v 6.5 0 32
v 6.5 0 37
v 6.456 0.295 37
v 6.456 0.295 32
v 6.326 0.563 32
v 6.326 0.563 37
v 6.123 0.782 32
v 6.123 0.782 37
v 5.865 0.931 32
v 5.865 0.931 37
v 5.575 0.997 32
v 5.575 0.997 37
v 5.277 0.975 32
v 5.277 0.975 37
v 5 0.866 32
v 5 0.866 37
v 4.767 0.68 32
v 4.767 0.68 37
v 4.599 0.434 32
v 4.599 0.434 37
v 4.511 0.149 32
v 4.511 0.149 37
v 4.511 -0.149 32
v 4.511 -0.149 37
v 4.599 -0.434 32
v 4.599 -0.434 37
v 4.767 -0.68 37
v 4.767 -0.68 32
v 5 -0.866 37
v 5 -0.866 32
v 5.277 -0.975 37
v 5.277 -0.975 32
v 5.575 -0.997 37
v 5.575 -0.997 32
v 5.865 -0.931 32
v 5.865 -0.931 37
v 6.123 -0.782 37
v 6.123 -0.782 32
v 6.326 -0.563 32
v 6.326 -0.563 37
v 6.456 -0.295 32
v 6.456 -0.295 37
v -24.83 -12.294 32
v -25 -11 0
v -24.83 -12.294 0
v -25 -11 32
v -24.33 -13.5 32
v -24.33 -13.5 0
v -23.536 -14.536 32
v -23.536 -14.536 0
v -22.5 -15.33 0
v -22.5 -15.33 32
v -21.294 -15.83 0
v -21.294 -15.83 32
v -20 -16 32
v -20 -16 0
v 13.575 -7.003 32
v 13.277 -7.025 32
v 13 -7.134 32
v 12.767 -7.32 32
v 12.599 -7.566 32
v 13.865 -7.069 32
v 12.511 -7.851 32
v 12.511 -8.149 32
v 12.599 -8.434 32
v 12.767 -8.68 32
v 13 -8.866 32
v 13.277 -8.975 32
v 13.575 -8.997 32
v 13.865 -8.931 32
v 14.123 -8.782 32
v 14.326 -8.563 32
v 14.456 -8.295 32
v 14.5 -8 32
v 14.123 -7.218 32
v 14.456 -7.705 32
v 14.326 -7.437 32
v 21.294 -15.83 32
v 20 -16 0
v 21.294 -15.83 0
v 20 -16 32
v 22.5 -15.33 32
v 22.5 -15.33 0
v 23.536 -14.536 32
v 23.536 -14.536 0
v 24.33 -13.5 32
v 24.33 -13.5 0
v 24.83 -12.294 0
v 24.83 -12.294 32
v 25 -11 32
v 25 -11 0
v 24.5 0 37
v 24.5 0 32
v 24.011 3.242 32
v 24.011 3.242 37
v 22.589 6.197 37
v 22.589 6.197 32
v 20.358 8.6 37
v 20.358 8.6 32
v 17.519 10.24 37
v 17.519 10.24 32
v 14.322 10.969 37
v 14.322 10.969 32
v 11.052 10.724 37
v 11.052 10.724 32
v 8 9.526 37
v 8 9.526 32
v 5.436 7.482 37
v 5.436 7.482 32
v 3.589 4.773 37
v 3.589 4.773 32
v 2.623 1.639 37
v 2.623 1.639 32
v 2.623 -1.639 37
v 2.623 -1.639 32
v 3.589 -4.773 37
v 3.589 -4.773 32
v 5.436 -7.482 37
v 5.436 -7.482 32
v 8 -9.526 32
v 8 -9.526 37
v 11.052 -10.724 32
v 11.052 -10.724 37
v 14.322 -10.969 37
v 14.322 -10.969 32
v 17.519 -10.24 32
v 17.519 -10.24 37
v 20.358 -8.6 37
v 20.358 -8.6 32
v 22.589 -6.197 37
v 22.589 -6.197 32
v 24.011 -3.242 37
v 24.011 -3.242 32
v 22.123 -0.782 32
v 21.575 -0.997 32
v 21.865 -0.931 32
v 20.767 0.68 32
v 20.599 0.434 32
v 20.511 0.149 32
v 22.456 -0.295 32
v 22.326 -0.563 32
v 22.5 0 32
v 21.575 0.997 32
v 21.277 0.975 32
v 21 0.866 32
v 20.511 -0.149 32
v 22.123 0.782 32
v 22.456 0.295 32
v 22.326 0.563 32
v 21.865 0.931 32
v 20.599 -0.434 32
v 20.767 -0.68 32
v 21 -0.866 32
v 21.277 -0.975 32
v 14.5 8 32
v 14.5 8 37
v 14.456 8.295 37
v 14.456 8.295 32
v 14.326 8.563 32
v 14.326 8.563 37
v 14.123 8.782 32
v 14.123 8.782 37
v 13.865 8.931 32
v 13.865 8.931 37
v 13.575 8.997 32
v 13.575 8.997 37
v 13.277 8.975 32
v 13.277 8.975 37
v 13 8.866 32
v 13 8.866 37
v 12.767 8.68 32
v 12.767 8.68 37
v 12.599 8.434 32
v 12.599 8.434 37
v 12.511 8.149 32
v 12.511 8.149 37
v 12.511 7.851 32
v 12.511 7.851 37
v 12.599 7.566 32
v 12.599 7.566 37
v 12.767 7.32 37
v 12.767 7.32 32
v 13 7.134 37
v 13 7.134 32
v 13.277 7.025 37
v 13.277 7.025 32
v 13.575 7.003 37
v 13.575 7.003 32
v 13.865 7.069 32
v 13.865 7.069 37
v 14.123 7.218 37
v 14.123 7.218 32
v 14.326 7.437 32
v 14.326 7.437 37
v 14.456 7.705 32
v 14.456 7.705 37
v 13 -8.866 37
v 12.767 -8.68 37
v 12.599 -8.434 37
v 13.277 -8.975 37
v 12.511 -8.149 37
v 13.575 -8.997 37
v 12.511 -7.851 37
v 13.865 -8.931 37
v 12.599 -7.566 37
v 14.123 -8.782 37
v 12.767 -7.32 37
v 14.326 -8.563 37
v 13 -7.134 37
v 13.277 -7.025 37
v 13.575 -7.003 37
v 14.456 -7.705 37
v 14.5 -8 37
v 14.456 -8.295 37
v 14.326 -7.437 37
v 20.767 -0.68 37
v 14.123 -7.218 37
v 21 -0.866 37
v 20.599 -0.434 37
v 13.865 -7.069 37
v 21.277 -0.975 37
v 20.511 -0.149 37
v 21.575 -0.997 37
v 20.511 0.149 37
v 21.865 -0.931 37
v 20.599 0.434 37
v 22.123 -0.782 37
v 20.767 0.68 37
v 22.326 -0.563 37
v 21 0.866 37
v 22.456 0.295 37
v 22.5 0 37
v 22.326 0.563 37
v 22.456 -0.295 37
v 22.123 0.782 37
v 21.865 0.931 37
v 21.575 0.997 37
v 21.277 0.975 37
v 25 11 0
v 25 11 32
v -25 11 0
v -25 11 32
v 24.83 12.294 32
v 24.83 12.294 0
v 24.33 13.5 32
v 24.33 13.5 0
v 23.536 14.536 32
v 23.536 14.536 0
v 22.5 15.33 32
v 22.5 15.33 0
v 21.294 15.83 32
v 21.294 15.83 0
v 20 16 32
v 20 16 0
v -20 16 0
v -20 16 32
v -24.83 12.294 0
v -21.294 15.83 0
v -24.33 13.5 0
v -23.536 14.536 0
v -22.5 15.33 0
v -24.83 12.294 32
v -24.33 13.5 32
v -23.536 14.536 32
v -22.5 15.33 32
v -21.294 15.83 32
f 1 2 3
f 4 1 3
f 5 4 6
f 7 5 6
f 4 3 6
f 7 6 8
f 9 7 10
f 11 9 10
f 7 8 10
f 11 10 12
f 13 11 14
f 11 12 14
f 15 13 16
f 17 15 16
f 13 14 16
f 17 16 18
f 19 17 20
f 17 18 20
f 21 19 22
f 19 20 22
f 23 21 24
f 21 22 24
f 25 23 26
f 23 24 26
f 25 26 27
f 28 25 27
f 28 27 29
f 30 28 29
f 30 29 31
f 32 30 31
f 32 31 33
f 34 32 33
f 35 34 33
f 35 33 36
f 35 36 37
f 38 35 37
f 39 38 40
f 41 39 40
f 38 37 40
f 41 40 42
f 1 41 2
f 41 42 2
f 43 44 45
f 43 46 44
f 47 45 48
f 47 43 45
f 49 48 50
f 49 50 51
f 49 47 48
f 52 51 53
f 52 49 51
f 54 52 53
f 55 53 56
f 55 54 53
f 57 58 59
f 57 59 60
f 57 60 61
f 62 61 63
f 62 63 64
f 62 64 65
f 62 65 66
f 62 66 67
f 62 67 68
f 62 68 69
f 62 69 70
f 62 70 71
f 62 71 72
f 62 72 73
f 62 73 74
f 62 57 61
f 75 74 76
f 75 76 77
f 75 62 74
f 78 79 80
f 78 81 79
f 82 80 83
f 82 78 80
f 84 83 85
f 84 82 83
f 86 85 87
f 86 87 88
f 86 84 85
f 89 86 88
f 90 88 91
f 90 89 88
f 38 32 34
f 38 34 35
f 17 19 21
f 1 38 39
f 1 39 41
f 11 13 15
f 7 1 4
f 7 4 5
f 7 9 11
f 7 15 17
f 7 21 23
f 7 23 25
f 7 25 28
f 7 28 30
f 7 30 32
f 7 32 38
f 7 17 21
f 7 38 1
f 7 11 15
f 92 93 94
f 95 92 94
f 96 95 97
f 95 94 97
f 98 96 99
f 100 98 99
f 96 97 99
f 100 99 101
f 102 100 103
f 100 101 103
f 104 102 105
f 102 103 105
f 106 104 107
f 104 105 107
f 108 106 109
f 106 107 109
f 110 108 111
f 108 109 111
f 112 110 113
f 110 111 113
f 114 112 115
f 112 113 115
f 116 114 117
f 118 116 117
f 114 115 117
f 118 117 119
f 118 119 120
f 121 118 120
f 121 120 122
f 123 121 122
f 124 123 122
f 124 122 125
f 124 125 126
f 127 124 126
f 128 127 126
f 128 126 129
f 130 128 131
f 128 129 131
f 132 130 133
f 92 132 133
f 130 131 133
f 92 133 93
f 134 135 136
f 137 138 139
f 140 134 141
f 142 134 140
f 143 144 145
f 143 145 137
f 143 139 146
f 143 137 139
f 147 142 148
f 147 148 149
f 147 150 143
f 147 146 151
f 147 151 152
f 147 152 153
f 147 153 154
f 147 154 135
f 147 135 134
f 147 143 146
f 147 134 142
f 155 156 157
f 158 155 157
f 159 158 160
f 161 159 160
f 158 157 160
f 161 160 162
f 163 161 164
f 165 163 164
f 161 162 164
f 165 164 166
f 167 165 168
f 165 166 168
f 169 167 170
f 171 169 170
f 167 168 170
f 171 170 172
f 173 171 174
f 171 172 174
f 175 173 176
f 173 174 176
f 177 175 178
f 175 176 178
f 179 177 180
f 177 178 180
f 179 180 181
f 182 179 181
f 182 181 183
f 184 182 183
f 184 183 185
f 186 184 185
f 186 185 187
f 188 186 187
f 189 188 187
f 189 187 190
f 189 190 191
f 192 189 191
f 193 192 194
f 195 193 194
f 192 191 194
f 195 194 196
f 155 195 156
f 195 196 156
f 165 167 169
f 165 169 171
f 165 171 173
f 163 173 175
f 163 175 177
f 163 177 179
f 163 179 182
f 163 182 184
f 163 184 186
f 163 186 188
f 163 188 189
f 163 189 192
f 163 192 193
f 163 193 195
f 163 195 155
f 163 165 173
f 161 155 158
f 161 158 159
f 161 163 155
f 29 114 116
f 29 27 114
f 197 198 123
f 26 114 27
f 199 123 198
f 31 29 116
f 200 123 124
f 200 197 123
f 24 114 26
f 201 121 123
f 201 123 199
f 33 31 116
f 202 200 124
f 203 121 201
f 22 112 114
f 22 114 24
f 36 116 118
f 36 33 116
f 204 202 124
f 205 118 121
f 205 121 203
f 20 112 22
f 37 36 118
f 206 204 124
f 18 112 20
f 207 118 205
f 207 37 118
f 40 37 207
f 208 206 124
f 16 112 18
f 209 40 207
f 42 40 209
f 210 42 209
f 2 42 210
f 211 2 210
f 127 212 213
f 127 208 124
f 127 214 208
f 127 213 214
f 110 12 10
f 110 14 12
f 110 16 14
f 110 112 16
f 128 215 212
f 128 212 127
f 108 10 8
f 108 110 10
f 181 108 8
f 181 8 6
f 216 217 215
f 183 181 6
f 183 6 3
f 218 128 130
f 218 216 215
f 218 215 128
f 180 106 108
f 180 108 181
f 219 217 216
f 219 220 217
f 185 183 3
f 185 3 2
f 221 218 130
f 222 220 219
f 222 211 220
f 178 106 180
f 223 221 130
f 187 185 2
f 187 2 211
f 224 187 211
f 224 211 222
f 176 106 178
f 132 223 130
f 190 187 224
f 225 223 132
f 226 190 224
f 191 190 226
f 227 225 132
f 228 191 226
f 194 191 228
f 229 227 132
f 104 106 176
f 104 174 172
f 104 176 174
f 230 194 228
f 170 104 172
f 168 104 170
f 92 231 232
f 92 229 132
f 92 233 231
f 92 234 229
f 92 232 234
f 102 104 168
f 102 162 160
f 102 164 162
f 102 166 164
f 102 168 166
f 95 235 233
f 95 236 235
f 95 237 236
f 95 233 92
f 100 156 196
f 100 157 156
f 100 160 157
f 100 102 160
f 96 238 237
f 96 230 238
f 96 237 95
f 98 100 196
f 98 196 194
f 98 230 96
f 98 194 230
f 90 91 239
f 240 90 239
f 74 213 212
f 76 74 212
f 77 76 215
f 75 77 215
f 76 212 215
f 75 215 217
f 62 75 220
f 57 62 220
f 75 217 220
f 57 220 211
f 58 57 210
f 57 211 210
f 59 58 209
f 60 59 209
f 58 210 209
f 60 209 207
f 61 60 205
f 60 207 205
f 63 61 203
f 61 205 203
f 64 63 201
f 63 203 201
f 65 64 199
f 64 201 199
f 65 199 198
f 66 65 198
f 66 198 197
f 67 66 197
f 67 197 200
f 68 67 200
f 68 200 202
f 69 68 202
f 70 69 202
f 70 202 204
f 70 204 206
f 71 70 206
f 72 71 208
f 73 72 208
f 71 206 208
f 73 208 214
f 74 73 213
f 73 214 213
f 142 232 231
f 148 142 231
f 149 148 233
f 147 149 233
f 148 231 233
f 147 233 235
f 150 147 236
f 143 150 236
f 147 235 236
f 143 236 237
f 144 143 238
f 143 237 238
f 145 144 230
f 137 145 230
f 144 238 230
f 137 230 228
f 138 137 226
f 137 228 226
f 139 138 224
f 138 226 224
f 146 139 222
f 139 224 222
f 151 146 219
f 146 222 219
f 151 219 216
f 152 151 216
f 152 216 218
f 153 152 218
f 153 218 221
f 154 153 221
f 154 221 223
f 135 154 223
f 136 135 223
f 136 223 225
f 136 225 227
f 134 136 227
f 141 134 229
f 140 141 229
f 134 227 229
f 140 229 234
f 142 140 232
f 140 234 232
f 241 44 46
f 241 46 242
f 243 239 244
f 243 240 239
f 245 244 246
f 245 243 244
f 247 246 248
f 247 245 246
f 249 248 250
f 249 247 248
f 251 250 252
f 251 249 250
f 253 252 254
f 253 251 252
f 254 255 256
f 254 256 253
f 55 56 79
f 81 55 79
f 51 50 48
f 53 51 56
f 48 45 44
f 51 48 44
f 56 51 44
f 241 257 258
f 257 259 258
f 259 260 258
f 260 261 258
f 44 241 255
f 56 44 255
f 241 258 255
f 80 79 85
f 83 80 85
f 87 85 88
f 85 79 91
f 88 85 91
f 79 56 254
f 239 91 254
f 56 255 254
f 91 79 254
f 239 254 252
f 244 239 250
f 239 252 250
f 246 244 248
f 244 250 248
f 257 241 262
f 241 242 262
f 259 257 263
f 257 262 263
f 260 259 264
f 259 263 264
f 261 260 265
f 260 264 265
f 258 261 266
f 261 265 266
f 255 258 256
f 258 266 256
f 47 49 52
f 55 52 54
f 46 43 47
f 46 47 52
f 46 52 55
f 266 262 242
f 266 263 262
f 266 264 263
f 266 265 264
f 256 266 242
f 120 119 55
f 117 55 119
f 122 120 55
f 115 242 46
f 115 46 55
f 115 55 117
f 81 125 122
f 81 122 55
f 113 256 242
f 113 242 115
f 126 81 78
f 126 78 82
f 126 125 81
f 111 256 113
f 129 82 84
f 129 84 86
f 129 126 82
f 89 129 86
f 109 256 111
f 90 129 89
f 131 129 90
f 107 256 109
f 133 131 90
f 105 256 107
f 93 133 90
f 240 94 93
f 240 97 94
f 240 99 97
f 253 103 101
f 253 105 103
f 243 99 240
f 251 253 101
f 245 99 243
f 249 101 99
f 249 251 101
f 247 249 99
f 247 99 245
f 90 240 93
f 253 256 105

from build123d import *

# Parameters (mm, degrees)
F0_W     = 50
F0_H     = 32
F1_DEPTH = 32
F2_R     = 5
F3_R     = 11
F4_DEPTH = 5
F5_R     = 1
F6_DEPTH = 5


with BuildPart() as f1:
    # F0 (on Top) → F1 (new body)
    with BuildSketch(Plane.XY):
        Rectangle(F0_W, F0_H)
    extrude(amount=F1_DEPTH)

    # F2
    f2_edges = [f1.edges().sort_by_distance(p)[0] for p in [
        (-25, -16, 16),
        (-25, 16, 16),
        (25, -16, 16),
        (25, 16, 16),
    ]]
    fillet(f2_edges, radius=F2_R)

    # F3 (on face) → F4 (join)
    with BuildSketch(Plane.XY.offset(32)):
        with Locations((13.5, 0)):
            Circle(F3_R)
    extrude(amount=F4_DEPTH)

    # F5 (on face) → F6 (cut)
    with BuildSketch(Plane.XY.offset(37)):
        with Locations((21.5, 0)):
            Circle(F5_R)
        with Locations((13.5, 8)):
            Circle(F5_R)
        with Locations((5.5, 0)):
            Circle(F5_R)
        with Locations((13.5, -8)):
            Circle(F5_R)
    extrude(amount=-F6_DEPTH, mode=Mode.SUBTRACT)


solid = f1.part
